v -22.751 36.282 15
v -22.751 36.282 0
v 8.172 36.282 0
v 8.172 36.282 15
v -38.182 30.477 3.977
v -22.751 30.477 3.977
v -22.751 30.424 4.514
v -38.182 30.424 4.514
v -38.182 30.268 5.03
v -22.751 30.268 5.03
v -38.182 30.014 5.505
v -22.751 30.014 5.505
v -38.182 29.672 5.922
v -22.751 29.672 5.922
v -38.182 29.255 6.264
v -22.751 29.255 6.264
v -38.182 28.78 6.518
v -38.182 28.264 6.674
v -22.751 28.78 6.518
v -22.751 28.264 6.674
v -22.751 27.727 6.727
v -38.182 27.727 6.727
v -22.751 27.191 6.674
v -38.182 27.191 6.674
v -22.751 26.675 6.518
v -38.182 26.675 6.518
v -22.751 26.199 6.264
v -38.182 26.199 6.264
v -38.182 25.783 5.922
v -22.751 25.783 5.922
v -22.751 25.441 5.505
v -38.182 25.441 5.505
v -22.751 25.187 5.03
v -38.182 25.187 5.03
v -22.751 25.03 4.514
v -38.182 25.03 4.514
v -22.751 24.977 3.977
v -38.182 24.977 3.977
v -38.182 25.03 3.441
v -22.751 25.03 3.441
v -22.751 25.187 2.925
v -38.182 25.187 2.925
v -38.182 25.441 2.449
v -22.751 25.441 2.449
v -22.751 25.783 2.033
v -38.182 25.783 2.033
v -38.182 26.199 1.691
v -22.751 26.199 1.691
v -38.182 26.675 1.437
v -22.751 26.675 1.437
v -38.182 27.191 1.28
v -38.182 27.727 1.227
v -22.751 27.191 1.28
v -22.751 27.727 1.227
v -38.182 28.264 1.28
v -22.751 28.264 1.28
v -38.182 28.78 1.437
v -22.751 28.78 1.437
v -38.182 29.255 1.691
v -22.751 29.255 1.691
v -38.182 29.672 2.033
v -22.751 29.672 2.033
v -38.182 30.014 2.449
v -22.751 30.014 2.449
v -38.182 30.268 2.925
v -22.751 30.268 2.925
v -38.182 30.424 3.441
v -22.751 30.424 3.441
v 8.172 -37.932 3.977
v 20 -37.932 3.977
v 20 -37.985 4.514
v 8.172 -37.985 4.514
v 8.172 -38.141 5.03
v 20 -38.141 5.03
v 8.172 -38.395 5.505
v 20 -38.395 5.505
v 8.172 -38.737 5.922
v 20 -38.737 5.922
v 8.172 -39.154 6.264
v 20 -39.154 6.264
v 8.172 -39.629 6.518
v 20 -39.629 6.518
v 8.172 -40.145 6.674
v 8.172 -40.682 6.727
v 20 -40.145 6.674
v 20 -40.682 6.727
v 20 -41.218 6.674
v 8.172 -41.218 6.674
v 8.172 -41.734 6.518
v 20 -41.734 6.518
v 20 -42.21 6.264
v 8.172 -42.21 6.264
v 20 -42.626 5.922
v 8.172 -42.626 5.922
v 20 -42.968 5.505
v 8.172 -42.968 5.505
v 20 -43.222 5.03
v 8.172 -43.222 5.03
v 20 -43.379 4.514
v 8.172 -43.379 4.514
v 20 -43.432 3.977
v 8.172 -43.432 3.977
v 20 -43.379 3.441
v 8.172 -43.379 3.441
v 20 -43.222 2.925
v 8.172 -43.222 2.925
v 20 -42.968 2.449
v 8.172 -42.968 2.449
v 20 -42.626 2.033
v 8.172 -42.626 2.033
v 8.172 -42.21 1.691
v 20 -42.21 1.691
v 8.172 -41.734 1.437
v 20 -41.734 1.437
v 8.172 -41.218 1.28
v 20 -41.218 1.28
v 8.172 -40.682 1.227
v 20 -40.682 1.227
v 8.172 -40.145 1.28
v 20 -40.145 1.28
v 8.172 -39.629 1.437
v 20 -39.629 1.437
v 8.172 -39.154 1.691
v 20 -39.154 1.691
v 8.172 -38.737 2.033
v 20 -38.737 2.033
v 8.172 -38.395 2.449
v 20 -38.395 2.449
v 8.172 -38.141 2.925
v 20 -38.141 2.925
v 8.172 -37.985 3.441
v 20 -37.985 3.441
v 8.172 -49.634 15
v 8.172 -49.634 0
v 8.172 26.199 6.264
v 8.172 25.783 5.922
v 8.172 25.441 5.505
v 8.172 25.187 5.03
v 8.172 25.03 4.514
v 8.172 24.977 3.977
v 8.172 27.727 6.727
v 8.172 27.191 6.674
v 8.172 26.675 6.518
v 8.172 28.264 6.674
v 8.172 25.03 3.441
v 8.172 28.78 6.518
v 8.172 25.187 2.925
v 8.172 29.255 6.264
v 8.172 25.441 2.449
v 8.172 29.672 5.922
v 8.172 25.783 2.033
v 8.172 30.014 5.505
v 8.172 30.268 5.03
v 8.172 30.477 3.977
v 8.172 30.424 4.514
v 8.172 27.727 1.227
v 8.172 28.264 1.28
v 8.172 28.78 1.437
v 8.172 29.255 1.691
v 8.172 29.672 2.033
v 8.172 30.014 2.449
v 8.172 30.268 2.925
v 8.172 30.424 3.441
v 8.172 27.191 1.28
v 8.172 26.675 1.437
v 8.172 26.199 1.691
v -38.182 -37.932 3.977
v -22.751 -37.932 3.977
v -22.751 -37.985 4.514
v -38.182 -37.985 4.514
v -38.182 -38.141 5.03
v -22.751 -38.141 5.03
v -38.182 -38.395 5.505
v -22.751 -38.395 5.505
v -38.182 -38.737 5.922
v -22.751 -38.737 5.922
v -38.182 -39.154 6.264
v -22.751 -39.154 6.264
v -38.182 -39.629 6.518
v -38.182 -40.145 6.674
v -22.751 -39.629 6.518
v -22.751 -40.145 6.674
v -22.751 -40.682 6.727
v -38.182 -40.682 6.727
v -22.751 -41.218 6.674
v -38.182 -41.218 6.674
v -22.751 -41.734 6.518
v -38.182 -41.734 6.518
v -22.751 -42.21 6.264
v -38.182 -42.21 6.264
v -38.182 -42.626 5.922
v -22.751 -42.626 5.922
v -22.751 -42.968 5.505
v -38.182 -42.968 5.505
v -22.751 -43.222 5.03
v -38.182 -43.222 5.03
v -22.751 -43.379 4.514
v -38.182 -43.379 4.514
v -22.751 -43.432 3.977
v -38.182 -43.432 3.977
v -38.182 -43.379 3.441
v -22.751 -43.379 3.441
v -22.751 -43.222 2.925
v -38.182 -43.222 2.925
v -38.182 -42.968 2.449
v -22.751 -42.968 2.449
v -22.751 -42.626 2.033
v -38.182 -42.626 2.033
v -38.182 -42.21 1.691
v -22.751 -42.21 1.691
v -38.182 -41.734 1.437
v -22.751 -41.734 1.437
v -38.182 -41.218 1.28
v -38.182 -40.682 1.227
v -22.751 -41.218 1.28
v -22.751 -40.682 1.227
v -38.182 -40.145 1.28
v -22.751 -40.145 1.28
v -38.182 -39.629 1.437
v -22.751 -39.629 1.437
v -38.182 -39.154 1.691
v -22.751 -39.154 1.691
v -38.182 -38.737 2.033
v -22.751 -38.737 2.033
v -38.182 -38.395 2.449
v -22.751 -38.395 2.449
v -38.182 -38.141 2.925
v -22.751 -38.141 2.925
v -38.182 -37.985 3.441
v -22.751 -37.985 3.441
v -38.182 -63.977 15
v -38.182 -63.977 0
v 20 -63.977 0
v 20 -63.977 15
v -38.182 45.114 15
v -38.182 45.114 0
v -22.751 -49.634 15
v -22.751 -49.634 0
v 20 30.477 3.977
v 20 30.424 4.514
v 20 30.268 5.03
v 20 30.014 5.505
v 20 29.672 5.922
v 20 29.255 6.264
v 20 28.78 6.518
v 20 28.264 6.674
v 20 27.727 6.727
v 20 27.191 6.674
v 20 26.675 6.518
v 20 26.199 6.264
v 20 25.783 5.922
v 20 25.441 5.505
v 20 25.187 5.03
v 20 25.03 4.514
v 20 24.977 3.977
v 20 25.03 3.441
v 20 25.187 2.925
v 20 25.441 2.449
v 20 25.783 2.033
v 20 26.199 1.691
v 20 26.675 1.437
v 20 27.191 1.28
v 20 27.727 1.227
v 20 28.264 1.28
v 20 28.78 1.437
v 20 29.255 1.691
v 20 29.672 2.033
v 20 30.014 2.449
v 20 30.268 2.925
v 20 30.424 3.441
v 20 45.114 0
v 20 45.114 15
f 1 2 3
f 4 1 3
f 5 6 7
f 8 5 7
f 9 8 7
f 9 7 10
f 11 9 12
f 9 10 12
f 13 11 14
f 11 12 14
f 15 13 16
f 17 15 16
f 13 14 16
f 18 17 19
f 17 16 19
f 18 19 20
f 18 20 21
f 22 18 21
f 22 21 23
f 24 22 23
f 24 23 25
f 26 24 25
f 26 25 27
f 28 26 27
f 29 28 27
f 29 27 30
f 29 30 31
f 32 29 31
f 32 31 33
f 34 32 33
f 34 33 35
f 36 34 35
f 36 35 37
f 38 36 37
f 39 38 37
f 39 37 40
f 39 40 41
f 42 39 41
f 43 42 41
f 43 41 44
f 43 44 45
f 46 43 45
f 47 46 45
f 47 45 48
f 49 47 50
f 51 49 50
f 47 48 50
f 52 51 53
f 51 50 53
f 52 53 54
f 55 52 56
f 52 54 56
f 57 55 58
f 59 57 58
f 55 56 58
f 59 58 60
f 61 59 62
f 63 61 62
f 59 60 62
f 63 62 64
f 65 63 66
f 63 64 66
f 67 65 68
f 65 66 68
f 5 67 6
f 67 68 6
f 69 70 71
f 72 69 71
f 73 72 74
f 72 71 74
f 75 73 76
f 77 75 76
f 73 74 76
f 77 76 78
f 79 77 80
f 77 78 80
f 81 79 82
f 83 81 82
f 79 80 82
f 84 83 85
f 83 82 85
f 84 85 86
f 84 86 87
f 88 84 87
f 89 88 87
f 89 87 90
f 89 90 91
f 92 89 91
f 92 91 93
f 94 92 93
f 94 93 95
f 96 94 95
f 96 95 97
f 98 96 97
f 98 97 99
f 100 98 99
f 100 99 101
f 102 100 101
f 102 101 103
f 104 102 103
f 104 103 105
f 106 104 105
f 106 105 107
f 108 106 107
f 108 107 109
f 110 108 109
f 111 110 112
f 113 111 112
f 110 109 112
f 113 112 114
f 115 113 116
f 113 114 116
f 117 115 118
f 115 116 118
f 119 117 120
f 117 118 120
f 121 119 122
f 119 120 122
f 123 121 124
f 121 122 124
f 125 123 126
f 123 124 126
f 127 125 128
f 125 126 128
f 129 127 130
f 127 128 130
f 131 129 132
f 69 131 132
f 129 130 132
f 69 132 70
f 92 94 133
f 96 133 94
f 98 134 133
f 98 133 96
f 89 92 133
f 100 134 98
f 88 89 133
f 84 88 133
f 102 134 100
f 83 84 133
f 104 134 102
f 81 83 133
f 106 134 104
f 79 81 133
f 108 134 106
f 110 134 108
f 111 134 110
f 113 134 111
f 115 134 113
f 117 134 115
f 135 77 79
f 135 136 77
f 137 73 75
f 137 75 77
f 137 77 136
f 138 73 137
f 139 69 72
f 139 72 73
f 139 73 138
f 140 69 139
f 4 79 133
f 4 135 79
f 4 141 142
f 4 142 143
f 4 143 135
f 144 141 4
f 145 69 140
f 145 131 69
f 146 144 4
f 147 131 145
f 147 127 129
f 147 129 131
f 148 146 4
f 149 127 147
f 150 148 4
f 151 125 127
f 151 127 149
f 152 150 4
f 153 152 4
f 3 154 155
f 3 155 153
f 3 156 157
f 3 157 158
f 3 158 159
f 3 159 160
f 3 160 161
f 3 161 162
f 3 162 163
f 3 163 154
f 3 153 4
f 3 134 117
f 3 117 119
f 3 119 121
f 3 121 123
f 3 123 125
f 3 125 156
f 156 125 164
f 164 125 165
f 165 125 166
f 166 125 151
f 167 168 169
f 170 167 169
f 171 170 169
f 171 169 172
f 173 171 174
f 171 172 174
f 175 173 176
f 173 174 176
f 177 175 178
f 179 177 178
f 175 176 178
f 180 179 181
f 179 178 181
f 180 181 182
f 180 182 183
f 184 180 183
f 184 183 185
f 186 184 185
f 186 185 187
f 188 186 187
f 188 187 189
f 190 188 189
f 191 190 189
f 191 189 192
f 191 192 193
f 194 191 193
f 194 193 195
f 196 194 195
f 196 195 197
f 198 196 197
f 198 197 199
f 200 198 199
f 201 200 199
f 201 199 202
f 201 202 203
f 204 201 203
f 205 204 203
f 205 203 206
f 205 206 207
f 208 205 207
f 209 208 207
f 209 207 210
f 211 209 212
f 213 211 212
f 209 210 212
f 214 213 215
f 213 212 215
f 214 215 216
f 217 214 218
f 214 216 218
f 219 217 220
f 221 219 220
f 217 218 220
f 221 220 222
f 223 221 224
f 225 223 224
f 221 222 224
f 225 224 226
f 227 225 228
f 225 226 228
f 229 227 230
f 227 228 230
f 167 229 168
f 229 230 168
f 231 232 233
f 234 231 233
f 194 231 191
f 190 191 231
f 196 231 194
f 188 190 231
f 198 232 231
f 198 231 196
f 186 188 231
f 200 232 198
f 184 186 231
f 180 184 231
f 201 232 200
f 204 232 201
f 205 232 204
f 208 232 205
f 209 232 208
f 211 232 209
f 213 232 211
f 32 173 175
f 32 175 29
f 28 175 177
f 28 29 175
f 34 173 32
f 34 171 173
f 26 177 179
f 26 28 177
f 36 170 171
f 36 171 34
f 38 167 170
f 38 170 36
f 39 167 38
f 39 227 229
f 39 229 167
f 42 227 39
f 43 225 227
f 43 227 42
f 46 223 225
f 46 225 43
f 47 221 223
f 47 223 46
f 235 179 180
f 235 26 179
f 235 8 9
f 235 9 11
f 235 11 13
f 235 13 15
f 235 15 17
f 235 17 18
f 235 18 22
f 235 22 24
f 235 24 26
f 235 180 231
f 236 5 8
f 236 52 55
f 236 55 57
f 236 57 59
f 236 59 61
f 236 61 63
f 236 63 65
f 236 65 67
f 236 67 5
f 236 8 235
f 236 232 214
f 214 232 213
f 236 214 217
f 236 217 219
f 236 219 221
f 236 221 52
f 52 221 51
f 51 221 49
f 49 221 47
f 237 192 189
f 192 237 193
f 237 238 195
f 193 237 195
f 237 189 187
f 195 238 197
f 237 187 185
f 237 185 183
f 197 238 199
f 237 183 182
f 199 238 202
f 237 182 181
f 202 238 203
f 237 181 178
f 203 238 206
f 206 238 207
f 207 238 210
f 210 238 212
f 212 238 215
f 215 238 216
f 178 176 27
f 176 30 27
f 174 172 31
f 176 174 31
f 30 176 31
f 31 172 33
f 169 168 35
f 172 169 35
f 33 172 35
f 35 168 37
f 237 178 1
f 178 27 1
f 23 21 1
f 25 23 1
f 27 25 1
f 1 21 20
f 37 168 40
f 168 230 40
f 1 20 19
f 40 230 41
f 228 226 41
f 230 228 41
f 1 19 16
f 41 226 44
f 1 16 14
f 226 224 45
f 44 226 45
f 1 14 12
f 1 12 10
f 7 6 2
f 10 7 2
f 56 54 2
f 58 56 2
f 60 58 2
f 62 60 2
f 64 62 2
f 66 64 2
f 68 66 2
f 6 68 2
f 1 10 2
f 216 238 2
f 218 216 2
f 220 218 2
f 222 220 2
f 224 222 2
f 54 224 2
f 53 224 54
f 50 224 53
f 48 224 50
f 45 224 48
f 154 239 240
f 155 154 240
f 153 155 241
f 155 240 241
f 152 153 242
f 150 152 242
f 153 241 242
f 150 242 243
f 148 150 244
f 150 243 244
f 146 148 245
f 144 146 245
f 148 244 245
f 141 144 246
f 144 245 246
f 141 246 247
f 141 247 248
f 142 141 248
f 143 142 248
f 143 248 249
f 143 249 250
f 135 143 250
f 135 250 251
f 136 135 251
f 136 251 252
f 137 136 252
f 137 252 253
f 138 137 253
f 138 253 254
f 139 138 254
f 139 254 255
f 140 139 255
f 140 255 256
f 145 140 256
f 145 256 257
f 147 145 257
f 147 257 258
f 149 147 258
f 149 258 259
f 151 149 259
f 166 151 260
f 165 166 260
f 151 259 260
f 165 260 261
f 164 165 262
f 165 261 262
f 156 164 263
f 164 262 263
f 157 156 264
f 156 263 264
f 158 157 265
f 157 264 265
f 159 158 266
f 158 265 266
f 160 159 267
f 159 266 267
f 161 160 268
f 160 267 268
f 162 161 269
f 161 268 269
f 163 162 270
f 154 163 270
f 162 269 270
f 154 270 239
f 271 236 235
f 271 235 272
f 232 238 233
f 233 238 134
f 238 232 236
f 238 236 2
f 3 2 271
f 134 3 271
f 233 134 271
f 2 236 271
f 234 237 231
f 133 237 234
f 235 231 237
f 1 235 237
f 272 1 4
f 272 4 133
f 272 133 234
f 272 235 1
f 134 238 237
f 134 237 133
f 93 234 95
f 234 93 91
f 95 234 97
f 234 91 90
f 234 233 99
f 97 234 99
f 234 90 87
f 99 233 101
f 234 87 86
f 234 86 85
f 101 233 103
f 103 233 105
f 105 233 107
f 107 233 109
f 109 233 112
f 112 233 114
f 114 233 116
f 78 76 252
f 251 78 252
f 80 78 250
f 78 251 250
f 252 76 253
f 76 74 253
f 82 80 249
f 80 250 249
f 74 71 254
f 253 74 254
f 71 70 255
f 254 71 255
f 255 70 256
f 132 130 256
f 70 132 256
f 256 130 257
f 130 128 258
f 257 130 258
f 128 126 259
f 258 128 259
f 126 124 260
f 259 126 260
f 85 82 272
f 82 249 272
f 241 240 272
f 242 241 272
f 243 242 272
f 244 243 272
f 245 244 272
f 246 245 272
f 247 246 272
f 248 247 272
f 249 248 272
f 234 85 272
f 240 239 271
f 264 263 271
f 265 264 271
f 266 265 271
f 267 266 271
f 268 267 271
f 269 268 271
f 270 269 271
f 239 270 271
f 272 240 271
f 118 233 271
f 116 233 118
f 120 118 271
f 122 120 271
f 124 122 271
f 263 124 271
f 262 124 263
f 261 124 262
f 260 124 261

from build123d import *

# Parameters (mm, degrees)
F0_W     = 58.18182
F0_H     = 109.090917
F0_W_2   = 30.922429
F0_H_2   = 85.915956
F1_DEPTH = 15
F3_D     = 5.5


with BuildPart() as f1:
    # F0 (on Top) → F1 (new body)
    with BuildSketch(Plane.XY):
        with Locations((-9.090909, -9.431821)):
            Rectangle(F0_W, F0_H)
        with Locations((-7.289599, -6.676143)):
            Rectangle(F0_W_2, F0_H_2, mode=Mode.SUBTRACT)
    extrude(amount=F1_DEPTH)

    # F3 (through all)
    with Locations(Plane(origin=(-38.181819, 0, 0), x_dir=(0, -1, 0), z_dir=(-1, 0, 0))):
        with Locations((-27.727274, 3.977273), (40.68182, 3.977273)):
            Hole(F3_D / 2)


solid = f1.part
